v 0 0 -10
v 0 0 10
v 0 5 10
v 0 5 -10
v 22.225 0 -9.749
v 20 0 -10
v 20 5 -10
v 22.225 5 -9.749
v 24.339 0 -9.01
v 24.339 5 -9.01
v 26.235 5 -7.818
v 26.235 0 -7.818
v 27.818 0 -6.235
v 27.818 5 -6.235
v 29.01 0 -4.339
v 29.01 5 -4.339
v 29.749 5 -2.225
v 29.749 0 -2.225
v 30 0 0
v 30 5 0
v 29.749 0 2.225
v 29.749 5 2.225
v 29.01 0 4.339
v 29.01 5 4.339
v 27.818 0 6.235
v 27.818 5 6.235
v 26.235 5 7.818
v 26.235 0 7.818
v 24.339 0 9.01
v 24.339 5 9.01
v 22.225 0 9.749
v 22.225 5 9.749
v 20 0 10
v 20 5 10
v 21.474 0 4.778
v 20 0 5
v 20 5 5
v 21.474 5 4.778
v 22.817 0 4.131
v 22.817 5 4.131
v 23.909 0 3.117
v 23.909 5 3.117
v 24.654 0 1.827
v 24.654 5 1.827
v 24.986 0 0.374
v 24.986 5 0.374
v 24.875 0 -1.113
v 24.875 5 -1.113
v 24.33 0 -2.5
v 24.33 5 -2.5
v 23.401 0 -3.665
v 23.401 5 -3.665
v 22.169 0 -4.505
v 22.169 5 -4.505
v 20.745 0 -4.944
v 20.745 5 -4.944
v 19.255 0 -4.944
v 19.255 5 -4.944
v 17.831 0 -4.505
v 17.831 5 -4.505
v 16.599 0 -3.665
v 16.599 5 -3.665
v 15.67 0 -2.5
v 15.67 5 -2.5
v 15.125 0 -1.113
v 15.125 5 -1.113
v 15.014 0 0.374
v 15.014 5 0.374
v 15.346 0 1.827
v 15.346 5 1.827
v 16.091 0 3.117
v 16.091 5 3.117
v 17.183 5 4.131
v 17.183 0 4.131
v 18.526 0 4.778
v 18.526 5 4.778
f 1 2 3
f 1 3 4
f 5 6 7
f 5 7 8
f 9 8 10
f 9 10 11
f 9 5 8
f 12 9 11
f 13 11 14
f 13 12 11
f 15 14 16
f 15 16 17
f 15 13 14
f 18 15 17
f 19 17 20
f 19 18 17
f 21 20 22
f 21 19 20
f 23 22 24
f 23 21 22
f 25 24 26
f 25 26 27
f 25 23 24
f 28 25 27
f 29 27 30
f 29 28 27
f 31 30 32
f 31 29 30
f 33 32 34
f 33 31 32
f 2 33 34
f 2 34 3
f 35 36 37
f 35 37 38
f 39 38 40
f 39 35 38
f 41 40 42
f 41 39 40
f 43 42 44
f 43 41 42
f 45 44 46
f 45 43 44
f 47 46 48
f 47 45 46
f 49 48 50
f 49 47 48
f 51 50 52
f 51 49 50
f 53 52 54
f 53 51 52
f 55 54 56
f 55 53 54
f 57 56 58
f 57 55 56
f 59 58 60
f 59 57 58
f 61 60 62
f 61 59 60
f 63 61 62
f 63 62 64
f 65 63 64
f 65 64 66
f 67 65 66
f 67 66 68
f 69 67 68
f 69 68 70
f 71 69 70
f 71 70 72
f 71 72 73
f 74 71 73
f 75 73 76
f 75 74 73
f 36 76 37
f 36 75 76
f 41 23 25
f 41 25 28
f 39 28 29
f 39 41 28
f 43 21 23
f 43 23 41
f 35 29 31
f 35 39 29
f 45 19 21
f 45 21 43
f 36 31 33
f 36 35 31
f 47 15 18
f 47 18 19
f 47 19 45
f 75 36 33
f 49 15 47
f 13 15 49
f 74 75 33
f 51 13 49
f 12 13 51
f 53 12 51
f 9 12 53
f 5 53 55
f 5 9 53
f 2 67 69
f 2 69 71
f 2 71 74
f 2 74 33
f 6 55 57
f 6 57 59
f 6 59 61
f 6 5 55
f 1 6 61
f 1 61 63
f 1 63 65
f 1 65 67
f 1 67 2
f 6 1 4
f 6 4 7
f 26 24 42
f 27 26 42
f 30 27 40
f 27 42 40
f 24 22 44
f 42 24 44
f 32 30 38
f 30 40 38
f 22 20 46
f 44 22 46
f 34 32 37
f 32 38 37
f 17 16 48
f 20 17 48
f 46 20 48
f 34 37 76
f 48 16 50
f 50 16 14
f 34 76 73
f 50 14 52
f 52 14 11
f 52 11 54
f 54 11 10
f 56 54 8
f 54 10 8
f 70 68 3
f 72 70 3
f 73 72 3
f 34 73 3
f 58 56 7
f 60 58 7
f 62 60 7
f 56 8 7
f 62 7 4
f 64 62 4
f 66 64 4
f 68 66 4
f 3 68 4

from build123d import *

# Parameters (mm, degrees)
SKETCH1_R           = 5
BOSS_EXTRUDE1_DEPTH = 5


with BuildPart() as part:
    # Sketch1 → Boss-Extrude1 (new body)
    with BuildSketch(Plane(origin=(0, 0, 0), x_dir=(1, 0, 0), z_dir=(0, 1, 0))):
        with BuildLine():
            Line((0, -10), (0, 10))
            Line((0, 10), (20, 10))
            ThreePointArc((20, 10), (30, 0), (20, -10))
            Line((20, -10), (0, -10))
        make_face()
        with Locations(Location((20, 0, 0), (0, 0, 270))):
            Circle(SKETCH1_R, mode=Mode.SUBTRACT)
    extrude(amount=BOSS_EXTRUDE1_DEPTH)


solid = part.part
